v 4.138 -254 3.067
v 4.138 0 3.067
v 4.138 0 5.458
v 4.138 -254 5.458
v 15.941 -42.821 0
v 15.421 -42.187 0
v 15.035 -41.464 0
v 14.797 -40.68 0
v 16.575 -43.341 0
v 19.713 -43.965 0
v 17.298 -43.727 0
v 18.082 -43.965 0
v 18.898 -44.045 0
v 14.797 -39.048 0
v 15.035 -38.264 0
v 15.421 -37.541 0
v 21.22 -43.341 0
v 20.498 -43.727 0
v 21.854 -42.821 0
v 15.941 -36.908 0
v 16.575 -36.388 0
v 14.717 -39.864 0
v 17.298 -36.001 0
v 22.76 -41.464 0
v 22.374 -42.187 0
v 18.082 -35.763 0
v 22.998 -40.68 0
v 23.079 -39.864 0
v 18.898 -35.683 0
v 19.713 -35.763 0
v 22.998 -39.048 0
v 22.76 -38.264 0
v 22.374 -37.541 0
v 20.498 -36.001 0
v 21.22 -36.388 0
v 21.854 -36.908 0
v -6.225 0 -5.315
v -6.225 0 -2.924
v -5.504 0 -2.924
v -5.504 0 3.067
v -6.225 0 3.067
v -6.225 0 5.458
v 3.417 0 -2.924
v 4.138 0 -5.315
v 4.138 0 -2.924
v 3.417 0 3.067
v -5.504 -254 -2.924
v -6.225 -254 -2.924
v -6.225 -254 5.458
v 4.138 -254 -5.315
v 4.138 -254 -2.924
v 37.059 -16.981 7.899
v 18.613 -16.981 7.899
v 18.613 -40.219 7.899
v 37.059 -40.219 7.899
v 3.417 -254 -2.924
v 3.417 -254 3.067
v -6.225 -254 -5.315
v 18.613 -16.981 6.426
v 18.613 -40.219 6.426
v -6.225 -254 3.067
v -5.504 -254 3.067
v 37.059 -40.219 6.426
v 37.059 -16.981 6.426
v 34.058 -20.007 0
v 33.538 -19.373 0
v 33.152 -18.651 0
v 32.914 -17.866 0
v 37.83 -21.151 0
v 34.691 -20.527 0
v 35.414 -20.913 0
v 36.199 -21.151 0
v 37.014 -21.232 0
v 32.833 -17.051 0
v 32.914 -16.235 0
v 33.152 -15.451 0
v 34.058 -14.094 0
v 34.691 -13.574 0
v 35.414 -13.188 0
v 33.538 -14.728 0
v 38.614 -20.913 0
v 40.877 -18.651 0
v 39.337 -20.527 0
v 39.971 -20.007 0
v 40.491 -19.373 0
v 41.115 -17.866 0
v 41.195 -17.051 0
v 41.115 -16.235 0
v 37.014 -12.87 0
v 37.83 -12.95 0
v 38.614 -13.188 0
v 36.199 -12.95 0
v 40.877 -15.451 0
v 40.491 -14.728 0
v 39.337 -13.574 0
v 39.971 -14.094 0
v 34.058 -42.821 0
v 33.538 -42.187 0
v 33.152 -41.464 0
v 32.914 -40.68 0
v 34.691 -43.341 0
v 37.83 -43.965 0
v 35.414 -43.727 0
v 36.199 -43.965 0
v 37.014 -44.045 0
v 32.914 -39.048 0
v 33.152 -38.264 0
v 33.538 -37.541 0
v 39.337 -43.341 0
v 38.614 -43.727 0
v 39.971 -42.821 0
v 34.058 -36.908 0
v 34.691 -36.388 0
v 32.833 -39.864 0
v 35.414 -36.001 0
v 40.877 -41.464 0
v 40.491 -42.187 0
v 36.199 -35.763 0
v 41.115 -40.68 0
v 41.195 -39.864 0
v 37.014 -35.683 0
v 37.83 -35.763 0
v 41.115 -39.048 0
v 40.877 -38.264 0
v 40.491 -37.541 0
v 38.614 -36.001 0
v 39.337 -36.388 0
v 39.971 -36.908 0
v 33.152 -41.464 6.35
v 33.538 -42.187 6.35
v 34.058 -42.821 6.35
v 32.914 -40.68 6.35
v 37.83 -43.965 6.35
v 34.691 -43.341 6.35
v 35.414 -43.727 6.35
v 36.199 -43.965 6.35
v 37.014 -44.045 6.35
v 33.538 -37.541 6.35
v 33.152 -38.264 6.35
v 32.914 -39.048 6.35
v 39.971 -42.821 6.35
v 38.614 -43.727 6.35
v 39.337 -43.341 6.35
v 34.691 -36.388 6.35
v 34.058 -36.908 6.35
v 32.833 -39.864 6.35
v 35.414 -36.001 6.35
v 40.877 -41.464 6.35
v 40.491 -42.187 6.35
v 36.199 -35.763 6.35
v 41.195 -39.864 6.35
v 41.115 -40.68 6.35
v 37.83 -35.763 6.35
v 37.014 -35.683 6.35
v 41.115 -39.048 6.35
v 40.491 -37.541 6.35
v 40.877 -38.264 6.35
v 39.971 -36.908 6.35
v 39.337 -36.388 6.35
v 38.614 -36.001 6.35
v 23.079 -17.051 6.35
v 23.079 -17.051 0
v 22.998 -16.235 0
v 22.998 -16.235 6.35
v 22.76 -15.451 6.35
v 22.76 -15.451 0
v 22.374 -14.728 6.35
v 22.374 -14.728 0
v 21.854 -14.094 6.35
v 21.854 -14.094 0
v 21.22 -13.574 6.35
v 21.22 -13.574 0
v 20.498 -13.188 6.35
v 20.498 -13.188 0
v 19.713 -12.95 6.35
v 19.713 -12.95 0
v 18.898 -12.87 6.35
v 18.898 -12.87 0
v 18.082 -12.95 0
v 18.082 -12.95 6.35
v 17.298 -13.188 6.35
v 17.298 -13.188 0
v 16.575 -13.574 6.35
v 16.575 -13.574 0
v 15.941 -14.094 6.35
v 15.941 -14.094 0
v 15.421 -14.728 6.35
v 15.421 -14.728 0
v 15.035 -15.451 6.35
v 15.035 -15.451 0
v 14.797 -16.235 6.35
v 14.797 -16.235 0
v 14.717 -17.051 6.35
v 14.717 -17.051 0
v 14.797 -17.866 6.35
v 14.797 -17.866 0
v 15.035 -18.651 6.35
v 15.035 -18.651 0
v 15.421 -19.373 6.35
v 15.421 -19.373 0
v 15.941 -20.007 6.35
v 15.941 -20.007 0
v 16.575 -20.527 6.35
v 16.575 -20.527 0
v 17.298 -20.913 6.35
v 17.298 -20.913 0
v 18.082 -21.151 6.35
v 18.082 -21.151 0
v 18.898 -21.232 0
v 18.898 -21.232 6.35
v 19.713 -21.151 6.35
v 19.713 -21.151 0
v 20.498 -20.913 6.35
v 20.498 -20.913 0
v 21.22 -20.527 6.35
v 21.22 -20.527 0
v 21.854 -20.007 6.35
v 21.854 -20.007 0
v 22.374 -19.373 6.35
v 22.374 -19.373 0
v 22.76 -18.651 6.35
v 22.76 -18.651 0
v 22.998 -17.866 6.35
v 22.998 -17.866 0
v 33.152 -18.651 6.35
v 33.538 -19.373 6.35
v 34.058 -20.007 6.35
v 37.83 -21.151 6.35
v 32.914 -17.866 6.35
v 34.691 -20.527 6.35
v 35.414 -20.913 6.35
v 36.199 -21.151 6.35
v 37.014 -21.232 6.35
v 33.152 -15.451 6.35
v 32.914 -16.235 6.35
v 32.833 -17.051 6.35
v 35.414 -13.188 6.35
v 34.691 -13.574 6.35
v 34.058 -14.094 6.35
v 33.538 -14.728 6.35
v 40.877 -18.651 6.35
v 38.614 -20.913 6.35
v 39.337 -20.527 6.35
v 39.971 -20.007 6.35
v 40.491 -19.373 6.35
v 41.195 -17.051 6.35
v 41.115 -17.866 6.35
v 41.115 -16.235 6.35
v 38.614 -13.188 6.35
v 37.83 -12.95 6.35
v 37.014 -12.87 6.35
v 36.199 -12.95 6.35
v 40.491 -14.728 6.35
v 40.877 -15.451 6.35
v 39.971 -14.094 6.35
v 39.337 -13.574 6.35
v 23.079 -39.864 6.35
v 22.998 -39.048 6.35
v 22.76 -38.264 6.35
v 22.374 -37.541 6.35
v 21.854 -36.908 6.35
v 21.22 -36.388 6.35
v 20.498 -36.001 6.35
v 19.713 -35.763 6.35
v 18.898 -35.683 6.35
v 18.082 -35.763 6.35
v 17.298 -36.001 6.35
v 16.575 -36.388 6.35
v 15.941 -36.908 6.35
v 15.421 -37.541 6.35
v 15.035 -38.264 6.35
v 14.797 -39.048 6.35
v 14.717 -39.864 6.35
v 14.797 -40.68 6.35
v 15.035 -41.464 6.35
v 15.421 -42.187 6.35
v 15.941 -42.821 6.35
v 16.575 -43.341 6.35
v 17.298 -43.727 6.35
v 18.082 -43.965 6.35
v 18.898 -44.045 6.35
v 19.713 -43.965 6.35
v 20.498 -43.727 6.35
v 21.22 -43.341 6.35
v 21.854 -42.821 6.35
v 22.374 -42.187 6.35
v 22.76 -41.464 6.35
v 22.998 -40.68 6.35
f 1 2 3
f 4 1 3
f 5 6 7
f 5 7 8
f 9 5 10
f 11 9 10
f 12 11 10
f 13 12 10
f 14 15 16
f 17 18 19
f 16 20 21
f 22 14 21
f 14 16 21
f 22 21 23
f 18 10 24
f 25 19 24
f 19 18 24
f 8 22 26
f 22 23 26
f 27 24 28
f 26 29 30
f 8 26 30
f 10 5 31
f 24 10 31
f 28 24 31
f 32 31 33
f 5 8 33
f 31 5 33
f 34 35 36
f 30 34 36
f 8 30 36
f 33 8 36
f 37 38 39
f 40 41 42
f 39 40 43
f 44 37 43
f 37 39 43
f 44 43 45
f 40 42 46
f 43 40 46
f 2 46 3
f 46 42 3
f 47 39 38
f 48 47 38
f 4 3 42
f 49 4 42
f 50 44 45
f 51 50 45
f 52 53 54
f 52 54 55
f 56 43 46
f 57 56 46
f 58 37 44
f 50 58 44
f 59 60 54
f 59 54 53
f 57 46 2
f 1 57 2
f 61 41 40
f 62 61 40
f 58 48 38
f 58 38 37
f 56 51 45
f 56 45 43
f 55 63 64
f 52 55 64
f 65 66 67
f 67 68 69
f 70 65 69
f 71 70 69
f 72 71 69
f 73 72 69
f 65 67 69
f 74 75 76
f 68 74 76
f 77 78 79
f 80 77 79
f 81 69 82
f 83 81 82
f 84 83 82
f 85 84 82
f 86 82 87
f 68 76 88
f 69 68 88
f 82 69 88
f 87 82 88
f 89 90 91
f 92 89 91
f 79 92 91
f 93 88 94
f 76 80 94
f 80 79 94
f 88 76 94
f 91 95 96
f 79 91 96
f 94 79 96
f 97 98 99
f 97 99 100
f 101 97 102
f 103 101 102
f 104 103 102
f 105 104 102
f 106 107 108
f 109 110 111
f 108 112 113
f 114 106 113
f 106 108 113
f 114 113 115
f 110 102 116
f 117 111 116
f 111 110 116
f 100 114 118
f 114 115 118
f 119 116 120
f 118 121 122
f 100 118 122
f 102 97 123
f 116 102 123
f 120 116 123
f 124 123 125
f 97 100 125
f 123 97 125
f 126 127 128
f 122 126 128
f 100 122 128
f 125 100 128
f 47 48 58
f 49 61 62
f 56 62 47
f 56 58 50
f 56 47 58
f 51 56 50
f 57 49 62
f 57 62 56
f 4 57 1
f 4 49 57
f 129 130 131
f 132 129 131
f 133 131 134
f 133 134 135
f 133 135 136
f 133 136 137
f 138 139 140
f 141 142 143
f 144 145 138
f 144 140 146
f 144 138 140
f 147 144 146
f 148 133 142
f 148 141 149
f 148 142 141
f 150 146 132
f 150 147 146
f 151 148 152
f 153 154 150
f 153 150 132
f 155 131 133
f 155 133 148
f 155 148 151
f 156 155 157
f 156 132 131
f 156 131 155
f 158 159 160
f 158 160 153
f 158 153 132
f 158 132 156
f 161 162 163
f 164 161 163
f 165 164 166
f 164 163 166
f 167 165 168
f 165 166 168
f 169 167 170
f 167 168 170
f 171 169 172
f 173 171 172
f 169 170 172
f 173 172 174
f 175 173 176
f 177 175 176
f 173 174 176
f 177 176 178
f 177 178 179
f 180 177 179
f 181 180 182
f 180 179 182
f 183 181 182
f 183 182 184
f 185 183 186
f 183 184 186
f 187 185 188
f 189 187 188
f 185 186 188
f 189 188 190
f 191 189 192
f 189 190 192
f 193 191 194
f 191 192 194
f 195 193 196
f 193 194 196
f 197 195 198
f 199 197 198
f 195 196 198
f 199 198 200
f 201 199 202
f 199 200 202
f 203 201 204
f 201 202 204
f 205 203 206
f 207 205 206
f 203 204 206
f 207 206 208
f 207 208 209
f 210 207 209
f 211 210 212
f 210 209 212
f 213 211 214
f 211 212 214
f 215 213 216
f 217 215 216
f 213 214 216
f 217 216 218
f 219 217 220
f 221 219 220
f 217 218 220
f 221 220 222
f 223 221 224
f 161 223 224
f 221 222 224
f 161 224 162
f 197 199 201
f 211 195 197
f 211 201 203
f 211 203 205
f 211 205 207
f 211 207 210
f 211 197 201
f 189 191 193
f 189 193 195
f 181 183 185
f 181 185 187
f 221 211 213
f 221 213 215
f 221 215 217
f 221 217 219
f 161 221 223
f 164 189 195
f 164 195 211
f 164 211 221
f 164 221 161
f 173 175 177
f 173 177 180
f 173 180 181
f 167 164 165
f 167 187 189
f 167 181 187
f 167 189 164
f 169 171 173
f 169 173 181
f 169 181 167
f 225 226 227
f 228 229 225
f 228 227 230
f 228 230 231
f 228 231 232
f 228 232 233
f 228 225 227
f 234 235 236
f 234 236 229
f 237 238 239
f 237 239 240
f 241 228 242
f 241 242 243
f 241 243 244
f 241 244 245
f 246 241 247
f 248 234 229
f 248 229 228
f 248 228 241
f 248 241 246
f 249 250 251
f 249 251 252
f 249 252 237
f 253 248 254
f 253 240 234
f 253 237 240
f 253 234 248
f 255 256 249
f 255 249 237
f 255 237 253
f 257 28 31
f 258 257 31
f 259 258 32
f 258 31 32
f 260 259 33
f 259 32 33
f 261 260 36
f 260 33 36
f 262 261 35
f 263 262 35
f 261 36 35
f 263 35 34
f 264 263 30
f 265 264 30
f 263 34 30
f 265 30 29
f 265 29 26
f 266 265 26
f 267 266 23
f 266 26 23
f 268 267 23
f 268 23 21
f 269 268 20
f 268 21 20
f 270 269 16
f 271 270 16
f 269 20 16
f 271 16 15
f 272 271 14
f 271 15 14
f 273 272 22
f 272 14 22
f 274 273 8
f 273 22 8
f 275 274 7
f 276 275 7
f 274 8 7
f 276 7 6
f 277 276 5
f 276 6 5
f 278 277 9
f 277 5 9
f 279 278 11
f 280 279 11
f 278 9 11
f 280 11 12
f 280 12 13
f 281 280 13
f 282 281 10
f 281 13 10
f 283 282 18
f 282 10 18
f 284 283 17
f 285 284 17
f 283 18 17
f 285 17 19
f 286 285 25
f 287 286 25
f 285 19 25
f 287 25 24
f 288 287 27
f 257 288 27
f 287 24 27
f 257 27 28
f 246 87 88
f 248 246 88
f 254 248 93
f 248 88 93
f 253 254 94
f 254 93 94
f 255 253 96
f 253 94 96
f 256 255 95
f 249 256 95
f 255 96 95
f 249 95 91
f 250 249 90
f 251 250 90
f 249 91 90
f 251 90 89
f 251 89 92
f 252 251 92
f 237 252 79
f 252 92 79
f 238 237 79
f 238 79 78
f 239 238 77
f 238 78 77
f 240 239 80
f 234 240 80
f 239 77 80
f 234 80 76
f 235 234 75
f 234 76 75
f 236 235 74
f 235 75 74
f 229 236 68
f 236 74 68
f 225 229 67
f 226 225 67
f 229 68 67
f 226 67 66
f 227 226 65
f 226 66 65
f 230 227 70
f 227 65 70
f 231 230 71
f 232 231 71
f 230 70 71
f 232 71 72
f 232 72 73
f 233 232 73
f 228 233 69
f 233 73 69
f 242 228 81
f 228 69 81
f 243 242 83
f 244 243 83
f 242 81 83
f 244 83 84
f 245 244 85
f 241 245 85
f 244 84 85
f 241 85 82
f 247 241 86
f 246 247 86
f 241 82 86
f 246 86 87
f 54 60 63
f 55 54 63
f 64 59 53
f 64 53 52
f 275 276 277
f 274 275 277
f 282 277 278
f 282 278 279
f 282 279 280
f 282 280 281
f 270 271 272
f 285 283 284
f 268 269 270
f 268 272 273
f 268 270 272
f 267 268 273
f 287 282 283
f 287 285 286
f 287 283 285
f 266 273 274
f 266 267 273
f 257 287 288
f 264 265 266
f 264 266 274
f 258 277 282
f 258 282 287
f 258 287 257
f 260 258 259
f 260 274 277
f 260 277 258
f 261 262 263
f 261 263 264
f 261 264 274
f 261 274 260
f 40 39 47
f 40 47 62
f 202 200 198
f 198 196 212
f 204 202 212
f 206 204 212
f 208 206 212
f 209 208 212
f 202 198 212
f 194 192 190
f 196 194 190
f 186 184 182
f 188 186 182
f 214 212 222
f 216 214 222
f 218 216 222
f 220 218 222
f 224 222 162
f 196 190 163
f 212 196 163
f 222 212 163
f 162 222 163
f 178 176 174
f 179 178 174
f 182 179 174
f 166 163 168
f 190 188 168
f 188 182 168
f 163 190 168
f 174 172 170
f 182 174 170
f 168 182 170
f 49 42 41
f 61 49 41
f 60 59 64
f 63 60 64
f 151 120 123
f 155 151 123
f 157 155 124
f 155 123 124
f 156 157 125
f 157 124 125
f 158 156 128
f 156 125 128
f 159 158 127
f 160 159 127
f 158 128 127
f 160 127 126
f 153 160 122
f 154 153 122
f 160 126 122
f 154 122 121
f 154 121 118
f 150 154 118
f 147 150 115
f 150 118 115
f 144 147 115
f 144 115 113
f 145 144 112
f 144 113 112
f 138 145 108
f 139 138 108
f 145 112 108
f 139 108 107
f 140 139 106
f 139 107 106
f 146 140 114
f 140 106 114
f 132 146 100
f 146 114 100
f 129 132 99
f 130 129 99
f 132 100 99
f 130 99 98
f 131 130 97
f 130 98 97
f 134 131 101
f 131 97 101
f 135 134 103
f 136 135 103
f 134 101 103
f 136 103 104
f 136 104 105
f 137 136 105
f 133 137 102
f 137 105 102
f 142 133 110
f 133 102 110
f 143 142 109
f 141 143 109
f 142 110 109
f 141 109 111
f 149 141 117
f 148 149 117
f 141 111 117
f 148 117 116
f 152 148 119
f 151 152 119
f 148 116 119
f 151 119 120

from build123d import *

# Parameters (mm, degrees)
F0_W     = 8.9209983125
F0_H     = 5.9905247763
F1_DEPTH = 254
F2_R     = 4.1810308668
F3_DEPTH = 6.35
F5_START = 6.4262
F4_W     = 18.4451695532
F4_H     = 23.2380088419
F5_DEPTH = 1.4732


with BuildPart() as f1:
    # F0 (on Front) → F1 (new body)
    with BuildSketch(Plane.XZ):
        Polygon((4.1382829659, 5.458438769), (-6.2247687019, 5.458438769), (-6.2247687019, 3.0669656117), (-5.5037420243, 3.0669656117), (3.4172562882, 3.0669656117), (4.1382829659, 3.0669656117), align=None)
        with Locations((-1.043242868, 0.0717032235)):
            Rectangle(F0_W, F0_H)
        Polygon((3.4172562882, -2.9235591646), (-5.5037420243, -2.9235591646), (-6.2247687019, -2.9235591646), (-6.2247687019, -5.315032322), (4.1382829659, -5.315032322), (4.1382829659, -2.9235591646), align=None)
    extrude(amount=F1_DEPTH)


with BuildPart() as f3:
    # F2 (on Top) → F3 (new body)
    with BuildSketch(Plane.XY):
        with Locations((18.8976201718, -17.0506061133)):
            Circle(F2_R)
    extrude(amount=F3_DEPTH)


with BuildPart() as f3b:
    # F2 (on Top) → F3, piece 2 (new body)
    with BuildSketch(Plane.XY):
        with Locations((37.0142709906, -17.0506061133)):
            Circle(F2_R)
    extrude(amount=F3_DEPTH)


with BuildPart() as f3c:
    # F2 (on Top) → F3, piece 3 (new body)
    with BuildSketch(Plane.XY):
        with Locations((37.0142709906, -39.8641667251)):
            Circle(F2_R)
    extrude(amount=F3_DEPTH)


with BuildPart() as f3d:
    # F2 (on Top) → F3, piece 4 (new body)
    with BuildSketch(Plane.XY):
        with Locations((18.8976201718, -39.8641667251)):
            Circle(F2_R)
    extrude(amount=F3_DEPTH)


with BuildPart() as f5:
    # F4 (on Top) → F5 (new body)
    with BuildSketch(Plane.XY.offset(F5_START)):
        with Locations((27.8359213844, -28.5998331383)):
            Rectangle(F4_W, F4_H)
    extrude(amount=F5_DEPTH)


solid = Compound([f1.part, f3.part, f3b.part, f3c.part, f3d.part, f5.part])
